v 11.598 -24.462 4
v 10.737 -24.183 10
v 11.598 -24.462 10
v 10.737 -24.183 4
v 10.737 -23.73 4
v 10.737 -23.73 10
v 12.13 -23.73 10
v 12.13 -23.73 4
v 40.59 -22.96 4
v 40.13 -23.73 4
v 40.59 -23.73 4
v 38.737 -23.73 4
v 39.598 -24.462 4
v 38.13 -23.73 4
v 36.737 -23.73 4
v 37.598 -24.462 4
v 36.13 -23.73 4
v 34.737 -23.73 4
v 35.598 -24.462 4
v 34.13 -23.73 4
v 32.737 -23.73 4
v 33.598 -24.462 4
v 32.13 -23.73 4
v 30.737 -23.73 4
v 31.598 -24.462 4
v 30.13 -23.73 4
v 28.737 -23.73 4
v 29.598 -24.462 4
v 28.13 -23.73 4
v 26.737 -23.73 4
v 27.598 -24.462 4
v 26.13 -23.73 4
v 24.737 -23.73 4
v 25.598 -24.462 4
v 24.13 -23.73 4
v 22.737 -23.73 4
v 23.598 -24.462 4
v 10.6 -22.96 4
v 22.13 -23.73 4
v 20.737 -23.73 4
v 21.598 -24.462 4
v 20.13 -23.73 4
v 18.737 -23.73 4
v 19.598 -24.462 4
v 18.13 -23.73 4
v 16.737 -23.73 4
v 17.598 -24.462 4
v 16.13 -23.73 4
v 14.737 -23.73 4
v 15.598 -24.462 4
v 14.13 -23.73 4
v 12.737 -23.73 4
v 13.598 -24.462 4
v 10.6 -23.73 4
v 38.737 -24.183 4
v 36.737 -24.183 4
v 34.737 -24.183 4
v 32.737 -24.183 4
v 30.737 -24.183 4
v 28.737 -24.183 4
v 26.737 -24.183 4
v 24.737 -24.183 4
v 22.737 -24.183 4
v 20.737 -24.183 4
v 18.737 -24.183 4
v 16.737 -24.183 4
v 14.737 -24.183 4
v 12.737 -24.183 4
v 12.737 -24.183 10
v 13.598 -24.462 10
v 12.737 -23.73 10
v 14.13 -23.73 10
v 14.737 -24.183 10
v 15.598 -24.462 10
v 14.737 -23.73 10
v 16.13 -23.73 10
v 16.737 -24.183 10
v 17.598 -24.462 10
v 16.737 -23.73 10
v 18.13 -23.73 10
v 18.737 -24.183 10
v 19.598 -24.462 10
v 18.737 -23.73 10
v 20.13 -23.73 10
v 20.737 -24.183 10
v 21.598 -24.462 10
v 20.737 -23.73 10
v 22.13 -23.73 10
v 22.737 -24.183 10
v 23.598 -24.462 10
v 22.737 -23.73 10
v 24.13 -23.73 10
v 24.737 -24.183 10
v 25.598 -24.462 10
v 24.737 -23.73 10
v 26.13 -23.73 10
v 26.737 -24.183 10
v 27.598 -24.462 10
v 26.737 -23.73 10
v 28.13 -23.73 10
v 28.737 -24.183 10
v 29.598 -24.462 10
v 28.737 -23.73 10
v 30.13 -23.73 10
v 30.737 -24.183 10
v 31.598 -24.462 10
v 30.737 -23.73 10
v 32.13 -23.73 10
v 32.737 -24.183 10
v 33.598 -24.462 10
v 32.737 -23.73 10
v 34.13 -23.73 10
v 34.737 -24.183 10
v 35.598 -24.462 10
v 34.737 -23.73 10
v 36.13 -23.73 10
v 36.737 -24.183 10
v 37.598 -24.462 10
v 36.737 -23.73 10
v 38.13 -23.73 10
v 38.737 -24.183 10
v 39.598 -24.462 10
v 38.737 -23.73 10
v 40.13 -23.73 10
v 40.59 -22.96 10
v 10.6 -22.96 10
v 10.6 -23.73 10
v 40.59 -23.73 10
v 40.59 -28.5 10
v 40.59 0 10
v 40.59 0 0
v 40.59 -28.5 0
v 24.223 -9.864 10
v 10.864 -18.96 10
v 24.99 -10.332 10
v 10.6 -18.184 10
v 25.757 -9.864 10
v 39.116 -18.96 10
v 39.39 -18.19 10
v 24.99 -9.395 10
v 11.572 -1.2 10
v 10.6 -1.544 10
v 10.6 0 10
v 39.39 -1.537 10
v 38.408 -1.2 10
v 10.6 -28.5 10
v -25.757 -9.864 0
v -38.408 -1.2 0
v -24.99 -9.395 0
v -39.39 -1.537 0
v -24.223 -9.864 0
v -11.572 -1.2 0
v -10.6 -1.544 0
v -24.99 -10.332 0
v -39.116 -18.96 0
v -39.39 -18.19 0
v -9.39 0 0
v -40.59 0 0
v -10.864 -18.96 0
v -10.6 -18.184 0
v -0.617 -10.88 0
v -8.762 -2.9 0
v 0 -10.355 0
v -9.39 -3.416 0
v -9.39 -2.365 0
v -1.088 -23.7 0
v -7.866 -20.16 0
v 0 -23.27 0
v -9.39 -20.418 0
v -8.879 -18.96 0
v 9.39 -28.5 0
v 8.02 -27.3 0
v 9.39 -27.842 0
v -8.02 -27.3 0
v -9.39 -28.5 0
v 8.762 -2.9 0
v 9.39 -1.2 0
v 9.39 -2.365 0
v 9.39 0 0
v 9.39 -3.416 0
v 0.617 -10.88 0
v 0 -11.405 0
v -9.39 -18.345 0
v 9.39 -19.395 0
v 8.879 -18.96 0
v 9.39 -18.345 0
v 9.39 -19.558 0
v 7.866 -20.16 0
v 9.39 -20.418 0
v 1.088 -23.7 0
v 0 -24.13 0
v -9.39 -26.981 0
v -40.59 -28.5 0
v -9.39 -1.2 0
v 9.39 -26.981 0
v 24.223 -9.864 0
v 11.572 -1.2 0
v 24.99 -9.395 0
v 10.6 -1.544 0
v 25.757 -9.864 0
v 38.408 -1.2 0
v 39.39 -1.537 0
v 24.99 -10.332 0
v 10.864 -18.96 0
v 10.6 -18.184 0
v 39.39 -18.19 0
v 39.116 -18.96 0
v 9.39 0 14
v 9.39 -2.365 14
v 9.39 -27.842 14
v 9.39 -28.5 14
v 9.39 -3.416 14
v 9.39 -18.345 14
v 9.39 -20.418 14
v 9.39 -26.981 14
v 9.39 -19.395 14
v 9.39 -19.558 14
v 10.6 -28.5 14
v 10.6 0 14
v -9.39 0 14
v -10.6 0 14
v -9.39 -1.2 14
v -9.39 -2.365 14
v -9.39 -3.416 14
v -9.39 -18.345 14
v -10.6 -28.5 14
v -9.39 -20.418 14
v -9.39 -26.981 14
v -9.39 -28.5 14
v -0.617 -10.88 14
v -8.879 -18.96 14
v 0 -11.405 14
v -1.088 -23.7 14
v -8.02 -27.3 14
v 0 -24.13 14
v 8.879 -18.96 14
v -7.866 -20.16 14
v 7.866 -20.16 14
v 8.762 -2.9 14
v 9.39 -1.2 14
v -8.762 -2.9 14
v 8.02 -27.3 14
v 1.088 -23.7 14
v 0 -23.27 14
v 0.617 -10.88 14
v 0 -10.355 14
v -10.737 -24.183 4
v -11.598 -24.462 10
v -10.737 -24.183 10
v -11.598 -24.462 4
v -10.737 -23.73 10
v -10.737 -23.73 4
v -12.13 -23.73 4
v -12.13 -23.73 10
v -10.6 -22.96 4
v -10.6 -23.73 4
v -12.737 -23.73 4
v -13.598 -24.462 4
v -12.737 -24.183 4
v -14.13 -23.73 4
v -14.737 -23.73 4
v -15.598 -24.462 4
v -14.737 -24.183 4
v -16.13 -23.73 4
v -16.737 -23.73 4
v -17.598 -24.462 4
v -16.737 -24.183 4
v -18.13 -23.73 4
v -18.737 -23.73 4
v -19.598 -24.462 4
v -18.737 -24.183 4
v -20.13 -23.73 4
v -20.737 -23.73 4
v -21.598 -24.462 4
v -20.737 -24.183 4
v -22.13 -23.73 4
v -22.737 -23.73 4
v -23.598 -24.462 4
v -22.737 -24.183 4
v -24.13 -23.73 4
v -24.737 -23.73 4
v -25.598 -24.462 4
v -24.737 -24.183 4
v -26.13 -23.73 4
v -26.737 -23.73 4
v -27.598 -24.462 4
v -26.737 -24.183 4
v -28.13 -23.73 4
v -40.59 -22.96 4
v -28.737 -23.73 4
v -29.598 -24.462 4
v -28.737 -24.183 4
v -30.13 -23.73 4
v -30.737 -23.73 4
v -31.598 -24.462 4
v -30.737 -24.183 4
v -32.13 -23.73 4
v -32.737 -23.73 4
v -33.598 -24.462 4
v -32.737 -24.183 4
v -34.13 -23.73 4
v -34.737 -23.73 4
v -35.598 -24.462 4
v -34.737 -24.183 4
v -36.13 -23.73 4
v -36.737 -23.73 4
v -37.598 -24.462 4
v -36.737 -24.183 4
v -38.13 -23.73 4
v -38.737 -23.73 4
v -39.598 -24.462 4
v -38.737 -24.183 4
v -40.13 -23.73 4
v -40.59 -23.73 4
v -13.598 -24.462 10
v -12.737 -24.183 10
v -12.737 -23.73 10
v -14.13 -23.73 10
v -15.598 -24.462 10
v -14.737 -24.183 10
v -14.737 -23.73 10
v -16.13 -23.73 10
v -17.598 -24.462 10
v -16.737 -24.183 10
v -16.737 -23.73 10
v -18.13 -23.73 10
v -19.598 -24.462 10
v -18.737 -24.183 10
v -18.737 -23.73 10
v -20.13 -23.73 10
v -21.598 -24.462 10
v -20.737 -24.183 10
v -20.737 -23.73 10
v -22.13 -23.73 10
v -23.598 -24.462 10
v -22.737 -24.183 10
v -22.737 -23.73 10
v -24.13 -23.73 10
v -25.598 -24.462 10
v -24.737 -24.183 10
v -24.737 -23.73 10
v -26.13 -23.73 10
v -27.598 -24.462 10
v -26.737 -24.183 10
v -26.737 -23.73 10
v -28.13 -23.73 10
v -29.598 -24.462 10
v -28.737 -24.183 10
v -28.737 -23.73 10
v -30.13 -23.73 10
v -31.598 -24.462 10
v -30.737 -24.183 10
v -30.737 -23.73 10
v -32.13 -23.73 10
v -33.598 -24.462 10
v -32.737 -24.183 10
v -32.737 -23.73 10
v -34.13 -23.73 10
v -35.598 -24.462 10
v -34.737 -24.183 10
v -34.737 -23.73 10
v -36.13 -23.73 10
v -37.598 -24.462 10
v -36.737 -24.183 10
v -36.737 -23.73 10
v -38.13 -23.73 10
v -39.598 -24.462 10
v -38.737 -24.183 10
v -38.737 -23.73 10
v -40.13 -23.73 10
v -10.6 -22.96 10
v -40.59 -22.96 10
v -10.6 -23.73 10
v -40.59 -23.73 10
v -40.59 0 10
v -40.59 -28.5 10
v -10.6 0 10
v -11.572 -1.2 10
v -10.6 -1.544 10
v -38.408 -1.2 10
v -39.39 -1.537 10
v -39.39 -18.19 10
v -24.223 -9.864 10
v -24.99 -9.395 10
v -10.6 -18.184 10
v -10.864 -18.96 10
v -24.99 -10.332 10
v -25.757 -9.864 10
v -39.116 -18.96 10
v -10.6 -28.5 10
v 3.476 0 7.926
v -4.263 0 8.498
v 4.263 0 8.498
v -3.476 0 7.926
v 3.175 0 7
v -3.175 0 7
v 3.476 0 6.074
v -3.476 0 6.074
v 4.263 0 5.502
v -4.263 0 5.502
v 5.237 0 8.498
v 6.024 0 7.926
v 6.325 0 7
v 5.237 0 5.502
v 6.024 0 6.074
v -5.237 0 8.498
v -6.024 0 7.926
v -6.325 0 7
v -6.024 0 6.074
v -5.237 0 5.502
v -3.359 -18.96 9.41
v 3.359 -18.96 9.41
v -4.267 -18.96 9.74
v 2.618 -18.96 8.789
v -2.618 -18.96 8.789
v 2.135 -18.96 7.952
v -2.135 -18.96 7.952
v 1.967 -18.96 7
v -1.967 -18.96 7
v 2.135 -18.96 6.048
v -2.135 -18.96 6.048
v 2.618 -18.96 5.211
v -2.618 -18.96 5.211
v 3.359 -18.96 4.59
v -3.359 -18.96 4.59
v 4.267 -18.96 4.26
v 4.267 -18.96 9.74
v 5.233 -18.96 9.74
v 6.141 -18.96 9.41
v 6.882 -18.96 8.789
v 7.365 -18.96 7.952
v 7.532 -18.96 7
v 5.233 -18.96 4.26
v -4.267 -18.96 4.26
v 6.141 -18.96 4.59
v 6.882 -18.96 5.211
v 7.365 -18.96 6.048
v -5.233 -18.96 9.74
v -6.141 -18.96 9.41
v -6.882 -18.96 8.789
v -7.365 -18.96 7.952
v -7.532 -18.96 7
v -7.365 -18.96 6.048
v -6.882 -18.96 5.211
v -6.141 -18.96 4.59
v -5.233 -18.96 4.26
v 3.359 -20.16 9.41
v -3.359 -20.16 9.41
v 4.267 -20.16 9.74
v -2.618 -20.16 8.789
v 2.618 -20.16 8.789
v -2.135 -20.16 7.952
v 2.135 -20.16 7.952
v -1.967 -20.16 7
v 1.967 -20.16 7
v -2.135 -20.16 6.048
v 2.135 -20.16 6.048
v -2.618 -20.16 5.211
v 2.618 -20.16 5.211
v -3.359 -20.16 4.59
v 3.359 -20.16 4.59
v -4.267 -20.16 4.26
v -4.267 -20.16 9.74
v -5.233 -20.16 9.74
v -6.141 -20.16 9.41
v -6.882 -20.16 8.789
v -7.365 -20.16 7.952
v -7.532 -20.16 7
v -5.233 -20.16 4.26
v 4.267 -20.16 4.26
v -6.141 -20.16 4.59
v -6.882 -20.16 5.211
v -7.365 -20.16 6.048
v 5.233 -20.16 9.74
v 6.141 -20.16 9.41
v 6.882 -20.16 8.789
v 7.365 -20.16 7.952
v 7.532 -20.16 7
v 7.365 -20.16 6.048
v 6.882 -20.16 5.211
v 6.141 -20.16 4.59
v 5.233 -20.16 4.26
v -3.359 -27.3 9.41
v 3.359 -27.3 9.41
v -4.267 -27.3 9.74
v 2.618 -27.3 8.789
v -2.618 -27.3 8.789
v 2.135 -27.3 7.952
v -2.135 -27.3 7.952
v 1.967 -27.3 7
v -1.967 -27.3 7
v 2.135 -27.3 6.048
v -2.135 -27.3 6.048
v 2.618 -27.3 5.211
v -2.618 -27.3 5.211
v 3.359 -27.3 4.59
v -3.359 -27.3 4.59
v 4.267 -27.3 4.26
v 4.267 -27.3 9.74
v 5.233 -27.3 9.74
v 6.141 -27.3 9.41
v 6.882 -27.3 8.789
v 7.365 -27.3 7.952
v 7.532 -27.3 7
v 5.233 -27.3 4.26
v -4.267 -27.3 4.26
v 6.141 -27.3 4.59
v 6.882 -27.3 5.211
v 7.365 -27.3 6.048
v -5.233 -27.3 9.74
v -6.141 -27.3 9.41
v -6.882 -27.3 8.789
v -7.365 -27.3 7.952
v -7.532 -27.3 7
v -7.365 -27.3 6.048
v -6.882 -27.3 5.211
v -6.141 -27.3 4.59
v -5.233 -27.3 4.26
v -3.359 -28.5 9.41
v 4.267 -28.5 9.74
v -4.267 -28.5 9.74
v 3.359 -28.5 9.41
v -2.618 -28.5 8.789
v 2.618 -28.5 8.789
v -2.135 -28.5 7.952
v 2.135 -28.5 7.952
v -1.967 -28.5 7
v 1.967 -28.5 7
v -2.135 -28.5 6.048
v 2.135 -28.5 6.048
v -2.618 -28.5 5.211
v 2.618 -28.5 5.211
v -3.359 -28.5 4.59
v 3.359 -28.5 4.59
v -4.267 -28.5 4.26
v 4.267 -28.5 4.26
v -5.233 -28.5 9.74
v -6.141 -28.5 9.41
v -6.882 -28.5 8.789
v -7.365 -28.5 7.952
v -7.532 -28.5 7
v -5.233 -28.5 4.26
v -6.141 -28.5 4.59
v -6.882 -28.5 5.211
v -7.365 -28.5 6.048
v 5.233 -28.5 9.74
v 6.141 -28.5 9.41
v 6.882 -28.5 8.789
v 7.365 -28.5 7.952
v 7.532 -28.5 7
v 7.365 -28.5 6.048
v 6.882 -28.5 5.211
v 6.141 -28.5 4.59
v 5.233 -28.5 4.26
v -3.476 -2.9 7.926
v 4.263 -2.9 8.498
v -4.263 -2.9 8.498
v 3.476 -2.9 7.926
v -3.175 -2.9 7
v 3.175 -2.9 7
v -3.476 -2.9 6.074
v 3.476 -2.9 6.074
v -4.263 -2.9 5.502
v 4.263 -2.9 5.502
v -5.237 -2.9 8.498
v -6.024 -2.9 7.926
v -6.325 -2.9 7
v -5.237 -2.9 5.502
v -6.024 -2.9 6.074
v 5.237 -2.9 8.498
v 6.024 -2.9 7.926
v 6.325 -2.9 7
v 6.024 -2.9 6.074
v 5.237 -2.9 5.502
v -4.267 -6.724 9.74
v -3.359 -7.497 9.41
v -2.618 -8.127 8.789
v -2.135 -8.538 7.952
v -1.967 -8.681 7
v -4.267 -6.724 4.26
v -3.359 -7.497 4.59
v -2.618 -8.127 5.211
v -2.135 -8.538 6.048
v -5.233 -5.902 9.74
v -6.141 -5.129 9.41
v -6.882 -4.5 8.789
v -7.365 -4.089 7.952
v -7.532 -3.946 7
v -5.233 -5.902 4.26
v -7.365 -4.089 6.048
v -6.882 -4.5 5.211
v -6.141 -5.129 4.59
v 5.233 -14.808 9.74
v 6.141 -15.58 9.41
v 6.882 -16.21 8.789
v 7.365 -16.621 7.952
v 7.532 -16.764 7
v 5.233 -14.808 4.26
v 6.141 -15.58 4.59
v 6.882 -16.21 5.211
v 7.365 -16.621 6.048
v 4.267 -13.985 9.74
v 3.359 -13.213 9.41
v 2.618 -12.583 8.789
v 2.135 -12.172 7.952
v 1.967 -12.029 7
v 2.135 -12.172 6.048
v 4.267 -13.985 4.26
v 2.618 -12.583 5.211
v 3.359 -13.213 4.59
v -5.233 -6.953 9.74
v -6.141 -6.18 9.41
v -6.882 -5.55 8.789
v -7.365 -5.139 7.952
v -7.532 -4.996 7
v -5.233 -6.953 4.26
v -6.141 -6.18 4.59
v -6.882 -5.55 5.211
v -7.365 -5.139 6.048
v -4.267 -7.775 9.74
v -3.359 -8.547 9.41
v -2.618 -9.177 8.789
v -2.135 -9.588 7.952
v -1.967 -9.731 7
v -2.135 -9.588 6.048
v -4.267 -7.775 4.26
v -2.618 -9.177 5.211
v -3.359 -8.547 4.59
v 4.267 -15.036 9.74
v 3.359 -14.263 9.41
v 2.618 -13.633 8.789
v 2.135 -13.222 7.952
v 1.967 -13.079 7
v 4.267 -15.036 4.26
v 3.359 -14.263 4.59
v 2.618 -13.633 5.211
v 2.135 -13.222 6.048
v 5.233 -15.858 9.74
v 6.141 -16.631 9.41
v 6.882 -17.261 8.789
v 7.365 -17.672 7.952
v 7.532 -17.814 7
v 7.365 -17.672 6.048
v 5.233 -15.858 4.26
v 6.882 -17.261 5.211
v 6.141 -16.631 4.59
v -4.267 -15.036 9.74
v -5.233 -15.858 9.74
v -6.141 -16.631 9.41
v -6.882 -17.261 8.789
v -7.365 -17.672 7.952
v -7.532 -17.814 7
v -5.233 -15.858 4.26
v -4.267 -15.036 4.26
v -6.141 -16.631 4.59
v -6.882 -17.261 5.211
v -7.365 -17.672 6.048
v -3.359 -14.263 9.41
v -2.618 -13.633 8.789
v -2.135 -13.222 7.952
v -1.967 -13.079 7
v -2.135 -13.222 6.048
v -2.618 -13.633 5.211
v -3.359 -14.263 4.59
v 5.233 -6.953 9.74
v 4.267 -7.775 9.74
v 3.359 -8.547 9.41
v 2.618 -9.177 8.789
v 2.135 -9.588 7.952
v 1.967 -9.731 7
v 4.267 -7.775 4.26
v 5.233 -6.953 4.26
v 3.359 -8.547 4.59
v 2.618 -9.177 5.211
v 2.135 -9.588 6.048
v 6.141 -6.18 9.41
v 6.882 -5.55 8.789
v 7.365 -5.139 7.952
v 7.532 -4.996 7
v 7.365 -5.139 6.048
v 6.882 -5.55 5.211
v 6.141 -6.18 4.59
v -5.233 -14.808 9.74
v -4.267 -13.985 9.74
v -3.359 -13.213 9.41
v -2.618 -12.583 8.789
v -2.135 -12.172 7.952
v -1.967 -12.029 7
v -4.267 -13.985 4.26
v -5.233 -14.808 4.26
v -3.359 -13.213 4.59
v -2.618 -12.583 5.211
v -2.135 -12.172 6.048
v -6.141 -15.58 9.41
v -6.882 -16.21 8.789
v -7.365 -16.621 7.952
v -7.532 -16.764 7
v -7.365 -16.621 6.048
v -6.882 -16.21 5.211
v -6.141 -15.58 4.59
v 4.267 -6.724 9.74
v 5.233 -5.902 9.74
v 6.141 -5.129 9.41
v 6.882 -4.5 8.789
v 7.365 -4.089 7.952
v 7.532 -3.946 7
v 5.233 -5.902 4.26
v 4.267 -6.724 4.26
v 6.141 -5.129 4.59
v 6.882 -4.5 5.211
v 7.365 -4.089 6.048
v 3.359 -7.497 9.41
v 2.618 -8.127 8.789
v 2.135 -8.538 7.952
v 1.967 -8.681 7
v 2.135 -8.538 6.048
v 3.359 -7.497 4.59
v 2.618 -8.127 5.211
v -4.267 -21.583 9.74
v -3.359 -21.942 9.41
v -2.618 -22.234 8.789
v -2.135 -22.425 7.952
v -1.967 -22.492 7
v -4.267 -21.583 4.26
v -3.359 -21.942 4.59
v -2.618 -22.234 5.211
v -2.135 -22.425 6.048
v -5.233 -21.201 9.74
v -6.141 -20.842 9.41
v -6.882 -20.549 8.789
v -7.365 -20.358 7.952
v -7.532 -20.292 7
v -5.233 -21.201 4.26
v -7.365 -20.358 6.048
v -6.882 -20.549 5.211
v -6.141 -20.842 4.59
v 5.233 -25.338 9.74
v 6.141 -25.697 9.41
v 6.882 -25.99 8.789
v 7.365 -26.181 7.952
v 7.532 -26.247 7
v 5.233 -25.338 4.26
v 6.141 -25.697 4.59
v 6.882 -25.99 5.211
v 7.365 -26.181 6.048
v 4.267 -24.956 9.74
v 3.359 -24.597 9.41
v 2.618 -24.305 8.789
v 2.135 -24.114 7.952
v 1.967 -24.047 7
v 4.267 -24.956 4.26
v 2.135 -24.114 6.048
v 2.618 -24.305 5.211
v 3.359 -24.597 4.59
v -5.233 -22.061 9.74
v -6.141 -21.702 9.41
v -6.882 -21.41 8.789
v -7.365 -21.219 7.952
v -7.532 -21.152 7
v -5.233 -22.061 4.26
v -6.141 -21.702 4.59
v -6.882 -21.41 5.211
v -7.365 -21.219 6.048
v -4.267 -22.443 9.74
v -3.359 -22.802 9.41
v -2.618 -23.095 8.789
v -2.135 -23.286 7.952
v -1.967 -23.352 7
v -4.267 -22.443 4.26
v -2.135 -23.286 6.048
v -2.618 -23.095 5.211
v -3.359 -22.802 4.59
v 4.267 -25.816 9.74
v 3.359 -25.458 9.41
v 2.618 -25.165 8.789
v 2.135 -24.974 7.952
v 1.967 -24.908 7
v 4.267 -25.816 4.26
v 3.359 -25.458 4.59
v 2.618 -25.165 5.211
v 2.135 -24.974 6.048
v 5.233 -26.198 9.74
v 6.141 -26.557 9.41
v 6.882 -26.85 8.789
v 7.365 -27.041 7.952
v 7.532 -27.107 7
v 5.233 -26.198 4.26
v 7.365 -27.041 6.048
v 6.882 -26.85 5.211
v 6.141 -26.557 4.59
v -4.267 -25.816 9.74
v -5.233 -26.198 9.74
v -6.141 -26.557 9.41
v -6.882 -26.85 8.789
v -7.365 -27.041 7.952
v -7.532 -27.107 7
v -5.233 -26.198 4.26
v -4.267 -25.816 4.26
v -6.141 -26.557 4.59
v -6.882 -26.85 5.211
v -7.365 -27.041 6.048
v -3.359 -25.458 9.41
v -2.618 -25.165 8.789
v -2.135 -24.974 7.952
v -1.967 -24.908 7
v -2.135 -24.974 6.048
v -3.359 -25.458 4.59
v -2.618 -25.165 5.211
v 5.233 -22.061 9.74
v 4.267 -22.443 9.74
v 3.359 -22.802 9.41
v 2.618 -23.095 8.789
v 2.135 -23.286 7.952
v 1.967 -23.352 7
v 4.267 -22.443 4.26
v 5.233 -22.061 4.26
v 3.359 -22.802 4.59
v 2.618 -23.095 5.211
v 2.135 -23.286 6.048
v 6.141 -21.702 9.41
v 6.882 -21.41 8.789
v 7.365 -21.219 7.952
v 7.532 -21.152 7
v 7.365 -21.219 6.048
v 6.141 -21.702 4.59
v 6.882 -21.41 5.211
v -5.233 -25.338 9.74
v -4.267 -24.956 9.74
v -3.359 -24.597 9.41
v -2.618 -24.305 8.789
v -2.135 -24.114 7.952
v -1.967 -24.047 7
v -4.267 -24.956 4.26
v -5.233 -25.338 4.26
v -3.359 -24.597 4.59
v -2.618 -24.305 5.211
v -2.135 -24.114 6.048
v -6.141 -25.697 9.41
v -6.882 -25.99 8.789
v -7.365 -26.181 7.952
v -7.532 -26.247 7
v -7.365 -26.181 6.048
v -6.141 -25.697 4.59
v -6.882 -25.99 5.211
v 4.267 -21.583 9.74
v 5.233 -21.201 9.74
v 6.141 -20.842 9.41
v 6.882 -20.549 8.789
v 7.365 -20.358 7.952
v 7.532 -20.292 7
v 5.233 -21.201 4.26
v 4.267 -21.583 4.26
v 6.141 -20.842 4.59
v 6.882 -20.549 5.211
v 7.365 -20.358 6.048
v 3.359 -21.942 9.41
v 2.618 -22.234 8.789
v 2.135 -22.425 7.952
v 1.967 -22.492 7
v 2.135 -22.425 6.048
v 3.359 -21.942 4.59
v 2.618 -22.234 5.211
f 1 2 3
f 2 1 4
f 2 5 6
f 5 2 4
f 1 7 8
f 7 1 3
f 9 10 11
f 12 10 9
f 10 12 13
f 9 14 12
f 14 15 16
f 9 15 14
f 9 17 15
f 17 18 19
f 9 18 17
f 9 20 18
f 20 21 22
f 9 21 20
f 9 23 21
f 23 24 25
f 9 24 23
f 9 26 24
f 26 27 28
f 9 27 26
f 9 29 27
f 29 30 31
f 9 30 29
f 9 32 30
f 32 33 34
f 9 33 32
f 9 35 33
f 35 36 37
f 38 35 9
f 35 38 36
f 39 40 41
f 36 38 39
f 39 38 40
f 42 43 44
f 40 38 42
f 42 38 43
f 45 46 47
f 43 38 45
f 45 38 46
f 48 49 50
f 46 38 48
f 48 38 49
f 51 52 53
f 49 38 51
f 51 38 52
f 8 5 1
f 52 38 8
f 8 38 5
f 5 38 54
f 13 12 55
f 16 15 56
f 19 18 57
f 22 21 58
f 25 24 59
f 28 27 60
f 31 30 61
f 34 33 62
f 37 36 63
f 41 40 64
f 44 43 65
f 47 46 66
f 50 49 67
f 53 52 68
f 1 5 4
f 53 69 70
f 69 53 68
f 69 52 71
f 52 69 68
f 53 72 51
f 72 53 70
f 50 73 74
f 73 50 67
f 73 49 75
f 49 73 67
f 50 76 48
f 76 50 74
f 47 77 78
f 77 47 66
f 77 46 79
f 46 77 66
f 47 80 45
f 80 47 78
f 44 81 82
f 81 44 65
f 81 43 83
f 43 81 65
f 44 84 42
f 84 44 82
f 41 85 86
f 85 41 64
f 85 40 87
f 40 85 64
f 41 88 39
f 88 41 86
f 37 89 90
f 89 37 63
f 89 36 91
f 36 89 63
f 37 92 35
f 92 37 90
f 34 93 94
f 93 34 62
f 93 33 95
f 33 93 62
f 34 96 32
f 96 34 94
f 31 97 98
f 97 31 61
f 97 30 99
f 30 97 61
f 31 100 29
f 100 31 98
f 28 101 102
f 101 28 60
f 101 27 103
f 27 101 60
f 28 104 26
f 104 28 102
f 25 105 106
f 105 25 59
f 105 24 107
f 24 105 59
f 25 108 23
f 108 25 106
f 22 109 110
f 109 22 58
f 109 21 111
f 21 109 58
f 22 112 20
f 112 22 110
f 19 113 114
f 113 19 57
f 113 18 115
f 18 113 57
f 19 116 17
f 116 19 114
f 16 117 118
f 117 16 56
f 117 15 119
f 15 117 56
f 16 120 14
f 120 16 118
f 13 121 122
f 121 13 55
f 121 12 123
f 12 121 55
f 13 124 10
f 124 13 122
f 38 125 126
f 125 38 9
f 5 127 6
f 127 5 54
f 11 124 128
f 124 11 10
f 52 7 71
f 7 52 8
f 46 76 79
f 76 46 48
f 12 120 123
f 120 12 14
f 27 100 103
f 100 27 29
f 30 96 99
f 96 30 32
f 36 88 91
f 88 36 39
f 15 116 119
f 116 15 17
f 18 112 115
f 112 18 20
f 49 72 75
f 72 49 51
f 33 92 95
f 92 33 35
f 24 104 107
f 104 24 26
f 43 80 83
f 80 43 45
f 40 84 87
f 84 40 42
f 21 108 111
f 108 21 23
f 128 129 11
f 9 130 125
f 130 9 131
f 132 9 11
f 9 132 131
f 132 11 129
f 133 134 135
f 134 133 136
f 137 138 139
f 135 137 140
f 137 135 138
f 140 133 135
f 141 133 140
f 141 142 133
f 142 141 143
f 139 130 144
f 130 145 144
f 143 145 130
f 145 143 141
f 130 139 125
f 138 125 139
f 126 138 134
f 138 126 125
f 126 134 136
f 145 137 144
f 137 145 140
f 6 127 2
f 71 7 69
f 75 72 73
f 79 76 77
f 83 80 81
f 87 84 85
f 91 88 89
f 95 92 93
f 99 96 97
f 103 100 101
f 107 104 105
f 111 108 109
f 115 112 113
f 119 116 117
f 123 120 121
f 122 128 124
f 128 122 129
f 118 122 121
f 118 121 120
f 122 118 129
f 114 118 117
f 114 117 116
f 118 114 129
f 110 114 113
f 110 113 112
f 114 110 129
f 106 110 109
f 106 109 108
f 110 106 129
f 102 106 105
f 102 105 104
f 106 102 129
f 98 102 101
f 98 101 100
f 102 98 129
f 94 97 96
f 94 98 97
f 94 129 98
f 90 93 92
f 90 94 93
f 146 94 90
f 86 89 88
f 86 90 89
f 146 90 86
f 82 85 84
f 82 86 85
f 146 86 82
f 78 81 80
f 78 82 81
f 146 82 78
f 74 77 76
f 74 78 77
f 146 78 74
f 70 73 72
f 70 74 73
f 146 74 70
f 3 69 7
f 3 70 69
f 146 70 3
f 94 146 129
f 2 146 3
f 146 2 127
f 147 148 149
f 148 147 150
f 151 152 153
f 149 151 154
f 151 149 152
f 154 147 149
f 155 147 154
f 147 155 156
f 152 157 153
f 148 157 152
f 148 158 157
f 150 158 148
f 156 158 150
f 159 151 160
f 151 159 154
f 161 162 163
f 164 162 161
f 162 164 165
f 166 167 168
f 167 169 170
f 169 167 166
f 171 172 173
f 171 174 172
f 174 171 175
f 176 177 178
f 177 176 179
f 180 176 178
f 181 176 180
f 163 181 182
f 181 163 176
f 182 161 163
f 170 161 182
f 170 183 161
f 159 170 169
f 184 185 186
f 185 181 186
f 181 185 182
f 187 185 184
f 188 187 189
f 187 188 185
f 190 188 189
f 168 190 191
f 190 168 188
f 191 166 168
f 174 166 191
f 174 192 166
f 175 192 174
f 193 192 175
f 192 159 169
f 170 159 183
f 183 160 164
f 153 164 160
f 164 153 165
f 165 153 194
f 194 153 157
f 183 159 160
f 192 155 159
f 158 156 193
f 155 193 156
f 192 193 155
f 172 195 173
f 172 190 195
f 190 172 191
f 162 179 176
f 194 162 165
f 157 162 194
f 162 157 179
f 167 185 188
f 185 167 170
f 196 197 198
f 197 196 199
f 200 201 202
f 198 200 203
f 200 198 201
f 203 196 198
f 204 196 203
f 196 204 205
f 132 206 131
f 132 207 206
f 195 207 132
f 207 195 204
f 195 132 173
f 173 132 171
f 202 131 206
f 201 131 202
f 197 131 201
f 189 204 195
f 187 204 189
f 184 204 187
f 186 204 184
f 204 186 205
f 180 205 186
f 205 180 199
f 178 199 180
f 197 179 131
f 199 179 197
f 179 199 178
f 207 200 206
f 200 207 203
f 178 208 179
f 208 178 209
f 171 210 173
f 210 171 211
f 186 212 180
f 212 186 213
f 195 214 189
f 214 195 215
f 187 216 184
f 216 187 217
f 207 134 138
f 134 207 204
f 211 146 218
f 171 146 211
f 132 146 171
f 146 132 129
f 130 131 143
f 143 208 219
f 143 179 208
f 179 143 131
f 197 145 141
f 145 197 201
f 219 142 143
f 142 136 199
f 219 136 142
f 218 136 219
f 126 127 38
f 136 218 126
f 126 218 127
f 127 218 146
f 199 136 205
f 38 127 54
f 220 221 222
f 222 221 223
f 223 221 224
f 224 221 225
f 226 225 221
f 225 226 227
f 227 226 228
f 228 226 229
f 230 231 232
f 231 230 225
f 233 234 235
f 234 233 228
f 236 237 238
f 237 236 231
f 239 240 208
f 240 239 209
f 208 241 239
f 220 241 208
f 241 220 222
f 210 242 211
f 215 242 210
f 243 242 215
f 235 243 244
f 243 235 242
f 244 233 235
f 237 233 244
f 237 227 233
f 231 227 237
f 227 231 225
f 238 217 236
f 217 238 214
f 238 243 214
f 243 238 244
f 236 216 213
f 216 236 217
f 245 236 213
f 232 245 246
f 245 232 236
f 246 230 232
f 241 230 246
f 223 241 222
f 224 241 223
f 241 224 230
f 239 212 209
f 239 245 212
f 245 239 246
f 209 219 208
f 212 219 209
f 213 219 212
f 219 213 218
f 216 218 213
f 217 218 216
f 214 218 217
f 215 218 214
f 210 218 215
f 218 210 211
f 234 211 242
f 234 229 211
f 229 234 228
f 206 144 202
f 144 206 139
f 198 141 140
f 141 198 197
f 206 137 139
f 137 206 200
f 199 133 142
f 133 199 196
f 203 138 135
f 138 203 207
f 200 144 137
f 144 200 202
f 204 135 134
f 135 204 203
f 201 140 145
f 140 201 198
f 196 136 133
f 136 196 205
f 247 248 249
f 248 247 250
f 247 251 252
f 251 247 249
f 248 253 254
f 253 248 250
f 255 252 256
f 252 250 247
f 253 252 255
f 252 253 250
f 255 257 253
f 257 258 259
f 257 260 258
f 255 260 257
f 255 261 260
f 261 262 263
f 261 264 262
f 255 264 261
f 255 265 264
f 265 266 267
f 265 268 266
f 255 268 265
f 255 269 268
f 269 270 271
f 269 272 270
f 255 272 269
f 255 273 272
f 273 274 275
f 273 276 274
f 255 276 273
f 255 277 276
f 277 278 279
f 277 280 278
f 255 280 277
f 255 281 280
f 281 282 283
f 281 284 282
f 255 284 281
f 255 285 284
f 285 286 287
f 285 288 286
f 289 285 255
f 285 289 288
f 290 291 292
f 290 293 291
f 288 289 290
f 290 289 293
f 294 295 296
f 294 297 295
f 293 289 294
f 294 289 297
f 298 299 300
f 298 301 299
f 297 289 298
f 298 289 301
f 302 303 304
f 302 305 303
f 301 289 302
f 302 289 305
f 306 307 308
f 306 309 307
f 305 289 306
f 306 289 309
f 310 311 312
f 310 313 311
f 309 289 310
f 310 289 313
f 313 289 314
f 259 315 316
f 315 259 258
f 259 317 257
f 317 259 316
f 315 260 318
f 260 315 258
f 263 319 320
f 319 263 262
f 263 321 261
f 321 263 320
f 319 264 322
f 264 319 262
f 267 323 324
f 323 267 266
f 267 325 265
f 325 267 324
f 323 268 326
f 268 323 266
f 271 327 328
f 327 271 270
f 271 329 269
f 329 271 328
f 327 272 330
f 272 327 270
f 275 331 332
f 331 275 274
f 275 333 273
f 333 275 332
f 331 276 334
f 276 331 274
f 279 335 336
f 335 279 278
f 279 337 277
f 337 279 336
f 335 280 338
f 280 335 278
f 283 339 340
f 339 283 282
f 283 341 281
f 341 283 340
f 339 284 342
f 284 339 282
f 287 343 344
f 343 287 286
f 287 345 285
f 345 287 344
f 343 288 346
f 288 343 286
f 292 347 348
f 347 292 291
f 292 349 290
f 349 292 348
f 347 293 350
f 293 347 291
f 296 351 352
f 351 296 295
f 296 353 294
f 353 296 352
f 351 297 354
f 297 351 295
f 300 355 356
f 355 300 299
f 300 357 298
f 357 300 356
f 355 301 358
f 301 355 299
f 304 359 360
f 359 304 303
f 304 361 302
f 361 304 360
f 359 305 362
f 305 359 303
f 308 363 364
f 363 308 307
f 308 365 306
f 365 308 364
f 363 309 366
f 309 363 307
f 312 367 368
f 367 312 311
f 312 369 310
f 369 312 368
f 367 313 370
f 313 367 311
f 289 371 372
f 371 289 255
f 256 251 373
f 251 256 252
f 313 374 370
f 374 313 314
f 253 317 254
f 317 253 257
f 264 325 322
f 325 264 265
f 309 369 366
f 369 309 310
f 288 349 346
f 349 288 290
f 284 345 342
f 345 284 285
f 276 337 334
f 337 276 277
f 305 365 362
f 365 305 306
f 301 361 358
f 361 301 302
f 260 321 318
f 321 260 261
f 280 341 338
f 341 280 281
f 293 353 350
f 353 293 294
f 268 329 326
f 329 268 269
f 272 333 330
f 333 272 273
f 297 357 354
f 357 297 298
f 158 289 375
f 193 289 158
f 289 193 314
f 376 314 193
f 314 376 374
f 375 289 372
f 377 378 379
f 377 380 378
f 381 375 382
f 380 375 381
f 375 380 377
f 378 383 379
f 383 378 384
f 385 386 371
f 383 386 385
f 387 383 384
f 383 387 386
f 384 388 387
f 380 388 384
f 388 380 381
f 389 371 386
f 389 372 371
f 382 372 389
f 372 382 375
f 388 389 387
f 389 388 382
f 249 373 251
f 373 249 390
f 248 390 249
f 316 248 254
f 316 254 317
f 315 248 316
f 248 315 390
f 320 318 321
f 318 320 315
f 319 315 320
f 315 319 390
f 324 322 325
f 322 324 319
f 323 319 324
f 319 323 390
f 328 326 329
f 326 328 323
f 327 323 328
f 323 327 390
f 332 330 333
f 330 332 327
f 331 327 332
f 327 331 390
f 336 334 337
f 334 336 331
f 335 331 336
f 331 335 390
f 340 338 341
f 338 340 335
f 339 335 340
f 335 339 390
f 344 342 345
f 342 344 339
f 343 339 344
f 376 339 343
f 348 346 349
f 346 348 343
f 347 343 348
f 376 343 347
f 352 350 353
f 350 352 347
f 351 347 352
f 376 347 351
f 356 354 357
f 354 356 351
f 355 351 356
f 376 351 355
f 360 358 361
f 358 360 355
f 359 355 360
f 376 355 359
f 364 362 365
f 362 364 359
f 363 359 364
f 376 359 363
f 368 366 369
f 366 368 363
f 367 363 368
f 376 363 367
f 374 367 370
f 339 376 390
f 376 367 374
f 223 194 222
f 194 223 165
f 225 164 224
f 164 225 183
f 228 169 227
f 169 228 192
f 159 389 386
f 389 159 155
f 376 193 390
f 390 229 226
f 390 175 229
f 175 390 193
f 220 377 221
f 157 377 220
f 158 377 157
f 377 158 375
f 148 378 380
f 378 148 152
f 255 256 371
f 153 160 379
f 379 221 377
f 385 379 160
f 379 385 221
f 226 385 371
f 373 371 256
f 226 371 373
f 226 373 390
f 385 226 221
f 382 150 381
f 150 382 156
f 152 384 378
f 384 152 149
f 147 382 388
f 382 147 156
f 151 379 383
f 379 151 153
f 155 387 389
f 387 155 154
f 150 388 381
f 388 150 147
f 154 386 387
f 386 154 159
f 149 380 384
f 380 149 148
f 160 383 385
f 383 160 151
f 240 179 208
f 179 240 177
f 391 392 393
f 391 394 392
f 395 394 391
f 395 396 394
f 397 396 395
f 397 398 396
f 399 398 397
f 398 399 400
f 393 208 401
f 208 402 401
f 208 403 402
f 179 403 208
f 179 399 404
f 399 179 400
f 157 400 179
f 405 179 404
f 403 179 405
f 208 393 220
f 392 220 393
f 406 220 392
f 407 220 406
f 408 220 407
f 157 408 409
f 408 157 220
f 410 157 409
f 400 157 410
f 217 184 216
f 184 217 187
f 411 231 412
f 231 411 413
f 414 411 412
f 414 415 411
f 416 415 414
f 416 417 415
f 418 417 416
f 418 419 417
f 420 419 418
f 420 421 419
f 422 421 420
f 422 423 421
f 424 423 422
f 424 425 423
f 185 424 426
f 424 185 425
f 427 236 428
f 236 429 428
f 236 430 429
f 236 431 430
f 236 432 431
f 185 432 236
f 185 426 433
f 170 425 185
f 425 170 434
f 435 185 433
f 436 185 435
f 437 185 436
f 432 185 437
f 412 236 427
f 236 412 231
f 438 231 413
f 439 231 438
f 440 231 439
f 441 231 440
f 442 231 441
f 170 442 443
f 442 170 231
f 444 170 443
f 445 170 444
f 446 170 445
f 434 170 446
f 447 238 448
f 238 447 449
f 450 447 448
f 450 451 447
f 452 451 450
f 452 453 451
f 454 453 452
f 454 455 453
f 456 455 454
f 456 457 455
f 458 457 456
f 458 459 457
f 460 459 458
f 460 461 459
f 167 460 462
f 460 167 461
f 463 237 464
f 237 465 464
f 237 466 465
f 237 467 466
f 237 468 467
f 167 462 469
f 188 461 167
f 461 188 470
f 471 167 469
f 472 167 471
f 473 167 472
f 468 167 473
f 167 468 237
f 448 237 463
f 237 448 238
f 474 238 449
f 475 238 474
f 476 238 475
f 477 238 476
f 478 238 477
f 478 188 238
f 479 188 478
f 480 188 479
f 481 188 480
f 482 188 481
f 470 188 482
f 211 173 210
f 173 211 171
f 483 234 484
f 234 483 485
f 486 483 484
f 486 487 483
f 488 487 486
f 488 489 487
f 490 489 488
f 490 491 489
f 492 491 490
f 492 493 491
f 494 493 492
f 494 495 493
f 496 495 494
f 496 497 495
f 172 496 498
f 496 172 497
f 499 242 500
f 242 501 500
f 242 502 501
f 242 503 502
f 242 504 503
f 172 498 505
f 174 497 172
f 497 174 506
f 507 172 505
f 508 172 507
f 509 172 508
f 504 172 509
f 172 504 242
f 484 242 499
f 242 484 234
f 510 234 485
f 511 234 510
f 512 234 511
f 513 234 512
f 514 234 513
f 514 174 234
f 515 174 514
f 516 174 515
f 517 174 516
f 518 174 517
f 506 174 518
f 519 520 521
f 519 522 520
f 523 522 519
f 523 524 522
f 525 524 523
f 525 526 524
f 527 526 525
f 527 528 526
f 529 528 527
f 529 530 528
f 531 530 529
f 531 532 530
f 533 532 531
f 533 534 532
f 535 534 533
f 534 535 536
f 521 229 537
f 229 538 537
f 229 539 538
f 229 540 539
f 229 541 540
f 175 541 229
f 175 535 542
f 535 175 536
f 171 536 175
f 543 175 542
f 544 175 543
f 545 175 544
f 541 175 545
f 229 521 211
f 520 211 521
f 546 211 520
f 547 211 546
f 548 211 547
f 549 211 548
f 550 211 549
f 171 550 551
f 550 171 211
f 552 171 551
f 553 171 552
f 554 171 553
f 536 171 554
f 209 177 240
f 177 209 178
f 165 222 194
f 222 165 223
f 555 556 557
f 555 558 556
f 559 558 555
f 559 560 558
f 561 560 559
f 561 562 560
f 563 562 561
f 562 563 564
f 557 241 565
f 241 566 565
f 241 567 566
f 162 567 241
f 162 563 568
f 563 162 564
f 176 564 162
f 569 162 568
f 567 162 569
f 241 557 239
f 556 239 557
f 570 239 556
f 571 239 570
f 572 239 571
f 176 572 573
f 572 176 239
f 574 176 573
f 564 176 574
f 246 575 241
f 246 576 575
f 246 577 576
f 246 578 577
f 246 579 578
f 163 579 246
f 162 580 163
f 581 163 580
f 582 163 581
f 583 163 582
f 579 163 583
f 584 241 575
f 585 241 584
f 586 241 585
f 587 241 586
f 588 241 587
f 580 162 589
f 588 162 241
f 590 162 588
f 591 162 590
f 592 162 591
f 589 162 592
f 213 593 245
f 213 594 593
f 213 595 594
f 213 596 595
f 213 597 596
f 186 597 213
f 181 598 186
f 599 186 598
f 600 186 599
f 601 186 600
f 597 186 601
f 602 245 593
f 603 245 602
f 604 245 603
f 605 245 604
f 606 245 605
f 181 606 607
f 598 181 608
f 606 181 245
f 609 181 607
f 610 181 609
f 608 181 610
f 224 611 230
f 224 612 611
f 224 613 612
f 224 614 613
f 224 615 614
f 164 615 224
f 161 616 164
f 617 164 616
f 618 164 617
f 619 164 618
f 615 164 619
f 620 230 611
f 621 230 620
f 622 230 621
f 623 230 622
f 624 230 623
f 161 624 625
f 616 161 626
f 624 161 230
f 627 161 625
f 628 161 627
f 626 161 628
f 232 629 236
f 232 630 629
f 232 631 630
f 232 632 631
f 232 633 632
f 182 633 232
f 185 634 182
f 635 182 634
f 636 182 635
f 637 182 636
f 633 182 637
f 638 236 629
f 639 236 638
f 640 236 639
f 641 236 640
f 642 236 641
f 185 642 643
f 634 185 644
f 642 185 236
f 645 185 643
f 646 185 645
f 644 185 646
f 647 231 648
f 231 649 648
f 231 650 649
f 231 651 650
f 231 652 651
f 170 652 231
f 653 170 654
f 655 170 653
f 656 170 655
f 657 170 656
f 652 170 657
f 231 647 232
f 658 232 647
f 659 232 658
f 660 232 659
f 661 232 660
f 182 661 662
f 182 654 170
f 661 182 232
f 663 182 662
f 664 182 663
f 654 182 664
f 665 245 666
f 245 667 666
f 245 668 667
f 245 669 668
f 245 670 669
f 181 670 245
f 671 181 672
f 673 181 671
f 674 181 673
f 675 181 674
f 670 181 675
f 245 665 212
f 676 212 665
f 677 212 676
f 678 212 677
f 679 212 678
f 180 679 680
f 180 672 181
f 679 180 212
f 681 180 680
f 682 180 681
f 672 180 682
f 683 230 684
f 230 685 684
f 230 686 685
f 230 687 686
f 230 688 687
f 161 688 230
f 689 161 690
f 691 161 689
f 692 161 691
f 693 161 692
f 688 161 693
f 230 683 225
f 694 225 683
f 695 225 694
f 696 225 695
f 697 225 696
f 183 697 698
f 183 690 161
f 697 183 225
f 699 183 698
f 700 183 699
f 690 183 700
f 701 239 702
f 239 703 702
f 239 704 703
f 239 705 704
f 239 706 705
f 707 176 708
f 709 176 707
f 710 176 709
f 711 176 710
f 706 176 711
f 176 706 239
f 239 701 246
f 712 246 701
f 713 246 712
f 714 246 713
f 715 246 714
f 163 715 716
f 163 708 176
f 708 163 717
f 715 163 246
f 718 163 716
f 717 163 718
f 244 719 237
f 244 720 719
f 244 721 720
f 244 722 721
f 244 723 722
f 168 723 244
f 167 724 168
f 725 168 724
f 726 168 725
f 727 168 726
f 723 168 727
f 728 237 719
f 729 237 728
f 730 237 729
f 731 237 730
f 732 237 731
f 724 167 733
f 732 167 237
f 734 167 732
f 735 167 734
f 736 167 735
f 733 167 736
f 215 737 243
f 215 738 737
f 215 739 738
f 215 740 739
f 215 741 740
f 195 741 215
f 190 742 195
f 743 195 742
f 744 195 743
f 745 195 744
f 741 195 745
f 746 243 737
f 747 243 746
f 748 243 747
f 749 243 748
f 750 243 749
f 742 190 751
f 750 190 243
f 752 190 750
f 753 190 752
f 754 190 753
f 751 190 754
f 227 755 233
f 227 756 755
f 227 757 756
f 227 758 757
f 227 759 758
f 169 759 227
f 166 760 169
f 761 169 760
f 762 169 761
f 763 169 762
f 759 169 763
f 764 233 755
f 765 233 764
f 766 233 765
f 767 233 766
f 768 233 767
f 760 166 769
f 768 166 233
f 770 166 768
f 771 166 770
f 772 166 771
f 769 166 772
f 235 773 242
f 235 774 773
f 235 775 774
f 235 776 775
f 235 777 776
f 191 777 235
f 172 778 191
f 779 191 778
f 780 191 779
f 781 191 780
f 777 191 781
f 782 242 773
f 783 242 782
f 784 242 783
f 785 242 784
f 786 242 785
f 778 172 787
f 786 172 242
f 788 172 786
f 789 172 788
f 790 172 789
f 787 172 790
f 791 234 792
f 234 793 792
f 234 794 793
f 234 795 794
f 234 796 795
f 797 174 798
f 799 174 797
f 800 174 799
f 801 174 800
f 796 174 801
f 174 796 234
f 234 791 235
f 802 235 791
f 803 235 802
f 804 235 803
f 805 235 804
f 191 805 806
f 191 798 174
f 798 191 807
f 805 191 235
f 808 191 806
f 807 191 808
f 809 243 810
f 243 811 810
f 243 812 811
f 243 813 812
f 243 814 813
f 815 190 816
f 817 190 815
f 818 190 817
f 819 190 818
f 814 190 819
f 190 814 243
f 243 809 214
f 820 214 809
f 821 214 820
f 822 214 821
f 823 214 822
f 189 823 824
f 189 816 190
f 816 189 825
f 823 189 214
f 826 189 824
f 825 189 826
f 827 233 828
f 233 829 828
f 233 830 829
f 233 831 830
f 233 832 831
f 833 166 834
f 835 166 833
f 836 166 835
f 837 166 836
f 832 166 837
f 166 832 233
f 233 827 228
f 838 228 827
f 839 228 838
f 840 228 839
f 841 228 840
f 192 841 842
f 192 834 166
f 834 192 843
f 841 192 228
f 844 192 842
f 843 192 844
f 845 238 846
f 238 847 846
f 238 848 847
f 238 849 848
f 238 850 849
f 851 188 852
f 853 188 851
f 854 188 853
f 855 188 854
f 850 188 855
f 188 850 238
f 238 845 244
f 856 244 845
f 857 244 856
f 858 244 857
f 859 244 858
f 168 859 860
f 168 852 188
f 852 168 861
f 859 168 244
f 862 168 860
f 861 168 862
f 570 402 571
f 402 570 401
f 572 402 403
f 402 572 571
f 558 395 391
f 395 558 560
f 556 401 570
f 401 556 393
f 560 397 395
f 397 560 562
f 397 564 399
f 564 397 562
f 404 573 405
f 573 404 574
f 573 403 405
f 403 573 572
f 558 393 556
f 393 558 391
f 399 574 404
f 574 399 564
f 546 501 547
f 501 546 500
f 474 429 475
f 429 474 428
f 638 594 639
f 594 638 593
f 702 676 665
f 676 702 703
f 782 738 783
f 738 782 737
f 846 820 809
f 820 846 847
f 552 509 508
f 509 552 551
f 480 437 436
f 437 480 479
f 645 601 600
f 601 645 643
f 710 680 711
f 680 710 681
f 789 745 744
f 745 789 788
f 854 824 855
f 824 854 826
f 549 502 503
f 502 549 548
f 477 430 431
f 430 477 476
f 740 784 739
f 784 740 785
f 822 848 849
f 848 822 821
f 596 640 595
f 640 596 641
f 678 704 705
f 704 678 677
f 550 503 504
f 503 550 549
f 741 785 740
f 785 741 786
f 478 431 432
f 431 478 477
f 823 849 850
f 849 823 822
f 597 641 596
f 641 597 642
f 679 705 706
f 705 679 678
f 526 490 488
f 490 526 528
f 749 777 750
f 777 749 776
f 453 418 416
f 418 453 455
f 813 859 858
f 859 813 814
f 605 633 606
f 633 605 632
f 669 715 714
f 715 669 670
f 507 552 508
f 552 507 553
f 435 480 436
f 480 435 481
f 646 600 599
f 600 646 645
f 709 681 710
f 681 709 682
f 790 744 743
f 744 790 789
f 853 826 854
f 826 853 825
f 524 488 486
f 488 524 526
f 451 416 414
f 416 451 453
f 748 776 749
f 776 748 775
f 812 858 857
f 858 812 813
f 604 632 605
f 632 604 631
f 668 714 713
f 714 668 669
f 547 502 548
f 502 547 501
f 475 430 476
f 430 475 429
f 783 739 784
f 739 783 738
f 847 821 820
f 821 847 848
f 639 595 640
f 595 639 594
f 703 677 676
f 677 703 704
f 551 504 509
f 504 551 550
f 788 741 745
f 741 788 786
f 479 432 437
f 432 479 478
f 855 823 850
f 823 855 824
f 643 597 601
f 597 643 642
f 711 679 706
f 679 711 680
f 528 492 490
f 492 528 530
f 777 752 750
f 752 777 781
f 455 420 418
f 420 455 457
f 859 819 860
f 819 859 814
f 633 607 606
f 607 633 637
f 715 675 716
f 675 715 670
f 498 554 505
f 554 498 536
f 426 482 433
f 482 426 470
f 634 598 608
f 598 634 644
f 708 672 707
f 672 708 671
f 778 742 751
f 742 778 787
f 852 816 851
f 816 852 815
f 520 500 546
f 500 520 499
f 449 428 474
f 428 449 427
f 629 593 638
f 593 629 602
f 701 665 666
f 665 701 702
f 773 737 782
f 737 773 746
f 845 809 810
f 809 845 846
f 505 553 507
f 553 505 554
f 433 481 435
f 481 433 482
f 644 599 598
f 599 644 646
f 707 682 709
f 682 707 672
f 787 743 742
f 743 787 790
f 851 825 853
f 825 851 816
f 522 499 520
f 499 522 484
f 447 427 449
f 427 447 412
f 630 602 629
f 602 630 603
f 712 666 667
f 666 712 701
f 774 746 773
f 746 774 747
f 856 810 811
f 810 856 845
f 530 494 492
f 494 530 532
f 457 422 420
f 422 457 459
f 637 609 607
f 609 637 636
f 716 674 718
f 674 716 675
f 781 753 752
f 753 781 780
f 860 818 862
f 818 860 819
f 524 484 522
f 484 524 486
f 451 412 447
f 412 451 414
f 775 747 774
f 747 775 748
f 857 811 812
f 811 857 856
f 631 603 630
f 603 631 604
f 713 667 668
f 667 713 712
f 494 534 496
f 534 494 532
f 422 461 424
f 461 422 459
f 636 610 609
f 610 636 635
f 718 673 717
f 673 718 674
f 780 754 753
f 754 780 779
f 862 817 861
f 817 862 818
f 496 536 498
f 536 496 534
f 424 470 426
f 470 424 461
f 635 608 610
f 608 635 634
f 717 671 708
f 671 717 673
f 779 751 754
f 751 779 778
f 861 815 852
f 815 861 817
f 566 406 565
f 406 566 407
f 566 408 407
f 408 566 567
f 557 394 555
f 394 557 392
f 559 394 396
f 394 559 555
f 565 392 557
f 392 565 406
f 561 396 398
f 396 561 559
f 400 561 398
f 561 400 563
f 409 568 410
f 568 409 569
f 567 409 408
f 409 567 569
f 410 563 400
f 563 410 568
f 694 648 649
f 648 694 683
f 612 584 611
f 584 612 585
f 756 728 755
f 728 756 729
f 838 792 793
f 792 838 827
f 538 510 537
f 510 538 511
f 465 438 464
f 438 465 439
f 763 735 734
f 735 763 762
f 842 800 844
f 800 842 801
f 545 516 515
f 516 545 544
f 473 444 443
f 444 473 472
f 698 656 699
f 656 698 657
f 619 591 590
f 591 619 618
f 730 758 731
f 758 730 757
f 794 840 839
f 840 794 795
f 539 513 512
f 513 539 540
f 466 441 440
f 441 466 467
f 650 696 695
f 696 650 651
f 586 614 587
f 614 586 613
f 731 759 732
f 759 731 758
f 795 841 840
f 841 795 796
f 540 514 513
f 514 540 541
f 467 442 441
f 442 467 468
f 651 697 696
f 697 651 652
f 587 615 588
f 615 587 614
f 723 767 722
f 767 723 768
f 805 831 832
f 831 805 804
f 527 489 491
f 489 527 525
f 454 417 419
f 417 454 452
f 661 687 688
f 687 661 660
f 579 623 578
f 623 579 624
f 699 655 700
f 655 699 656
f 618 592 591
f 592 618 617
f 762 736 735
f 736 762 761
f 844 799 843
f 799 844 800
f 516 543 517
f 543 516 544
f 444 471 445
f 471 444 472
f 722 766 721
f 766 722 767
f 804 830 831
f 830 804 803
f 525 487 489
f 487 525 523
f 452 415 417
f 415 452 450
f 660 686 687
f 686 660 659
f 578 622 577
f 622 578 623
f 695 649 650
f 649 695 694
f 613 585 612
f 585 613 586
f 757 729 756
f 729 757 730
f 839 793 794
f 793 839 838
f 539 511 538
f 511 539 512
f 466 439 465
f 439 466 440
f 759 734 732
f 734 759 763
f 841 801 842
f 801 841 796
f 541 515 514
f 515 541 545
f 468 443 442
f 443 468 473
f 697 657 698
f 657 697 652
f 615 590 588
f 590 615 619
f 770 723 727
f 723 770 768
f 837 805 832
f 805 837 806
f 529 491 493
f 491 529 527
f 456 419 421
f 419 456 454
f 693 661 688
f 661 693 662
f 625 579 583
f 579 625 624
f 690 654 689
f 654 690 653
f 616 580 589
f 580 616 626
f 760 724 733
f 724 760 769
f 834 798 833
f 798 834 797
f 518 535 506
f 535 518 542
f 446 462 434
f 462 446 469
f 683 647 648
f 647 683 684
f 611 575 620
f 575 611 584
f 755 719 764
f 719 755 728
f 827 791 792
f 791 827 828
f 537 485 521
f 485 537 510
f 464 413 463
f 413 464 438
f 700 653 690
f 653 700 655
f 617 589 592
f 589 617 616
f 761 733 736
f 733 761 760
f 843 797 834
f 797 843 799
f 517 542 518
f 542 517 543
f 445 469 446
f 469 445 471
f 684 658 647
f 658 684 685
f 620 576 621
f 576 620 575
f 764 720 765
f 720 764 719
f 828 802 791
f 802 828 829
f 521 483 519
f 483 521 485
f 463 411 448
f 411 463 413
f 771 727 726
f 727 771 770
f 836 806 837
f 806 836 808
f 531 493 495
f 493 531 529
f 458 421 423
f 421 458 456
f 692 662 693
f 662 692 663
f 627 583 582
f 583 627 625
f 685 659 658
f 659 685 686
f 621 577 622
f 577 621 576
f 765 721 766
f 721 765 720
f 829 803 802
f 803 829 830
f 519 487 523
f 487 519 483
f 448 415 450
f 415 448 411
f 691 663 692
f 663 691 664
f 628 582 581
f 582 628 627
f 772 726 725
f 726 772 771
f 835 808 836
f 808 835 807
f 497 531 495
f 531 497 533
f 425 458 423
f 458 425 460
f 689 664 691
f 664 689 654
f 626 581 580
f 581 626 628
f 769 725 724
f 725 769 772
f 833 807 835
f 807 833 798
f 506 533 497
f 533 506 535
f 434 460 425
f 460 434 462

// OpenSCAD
// -*- mode: SCAD ; c-file-style: "ellemtel" ; coding: utf-8 -*-
//
// Y Belt holder for the Průša-style GeeTech i3 pro C
//
// © 2017–18 Roland Sieker <ospalh@gmail.com>
// Licence: CC-BY-SA 4.0

// … to preview. You will get all parts when you click “Create Thing”.
part = "holder"; // [holder: the y belt holder, square: square nut holder, hex: hex nut holder, test: test shape for sizing the belt]

// Set this to “render” and click on “Create Thing” when done with the setup.
preview = 1; // [0:render, 1:preview]


// The main dimensions of the printer
belt_bed_d = 24.5; // Distance the belt should be below the bed.
// When this is off too much, the belt tension varies, which can’t be good.
// Measure from the bed to the bottom of the belt.

hole_hole_y = 9.5;
// Distance between the mounting holes

d_screw = 3;  // M3 screws.
d_washer = 5.3;
// Use two square nuts
nut_t = 1.7;
nut_w = 5.6;
// screw_length = 10;

h_nut_t = 2.3;
h_nut_d = 5.4;
h_nut_r =  h_nut_d/sqrt(3);


// Dimensions of the belt (apparently GT2)
belt_pitch = 2;
/* belt_w = 6; */
belt_w = 6;
belt_t1 = 0.7;
belt_r = 0.7;


// Dimensions of the holder
truss_r_w = 1.2;  // Width of rectancgular truss members
truss_d_w = 0.8;  // Width of diagonal truss members
belt_bracket_w = 4;  // Width of the side and lower part of the belt brackets.
// They have to be sturdier than the trusses, as they are free hanging
belt_bracket_y = 30; // Length  of one belt bracket

extra_z = 4; // for the screw holes


swf = 1.05; // (wiggle factor)
bwf = 1.10; // (wiggle factor)
ms = 0.01; // Muggeseggle

// fn for differently sized objects and fs, fa; all for preview or rendering.
pna = 40;
pnb = 15;
pa = 5;
ps = 1;
rna = 180;
rnb = 30;
ra = 1;
rs = 0.1;
function na() = (preview) ? pna : rna;
function nb() = (preview) ? pnb : rnb;
$fs = (preview) ? ps : rs;
$fa = (preview) ? pa : ra;


enw = nut_w * swf;
ebt = belt_t1 * bwf;
ebr = belt_r * bwf;

fz = belt_bracket_w + belt_w;
fzc = fz + extra_z;
inner_truss_y = hole_hole_y + enw + 2 * nut_t;

r_sh = d_screw/2 * swf;
r_waho = d_washer/2 * swf;

y_0 = 0; // Datum

some_distance_x =  belt_bracket_y/2;
some_distance_y =  belt_bed_d/2;



print_part();
// preview_parts();



module print_part()
{
   if ("holder" == part)
   {
      belt_holder();
   }
   if ("square" == part)
   {
      square_nut_holder();
   }
   if ("hex" == part)
   {
      hex_nut_holder();
   }
   if ("test" == part)
   {
      belt_test_shape();
   }
}

module preview_parts()
{
   belt_holder();
   translate([0, some_distance_y, 0])
   {
      translate([-some_distance_x, 0, 0])
      {
         square_nut_holder();
      }
      translate([some_distance_x, 0, 0])
      {
         hex_nut_holder();
      }
   }
   translate([0, 2*some_distance_y, 0])
   {
      belt_test_shape();
   }
}





module belt_holder()
{
// Create the actual shapes
   translate([inner_truss_y/2, 0, 0])
   {
      one_bracket();
   }
   mirror()
   {
      translate([inner_truss_y/2, 0, 0])
      {
         one_bracket();
      }
   }
   center_bracket();
}

module square_nut_holder()
{
   difference()
   {
      translate([0,0,(truss_r_w+nut_t)/2])
      {
         cube(
            [hole_hole_y+nut_w+2*truss_r_w, nut_w+2*truss_r_w, (truss_r_w+nut_t)],
            center=true);

      }

      holes();
      mirror()
      {
         holes();
      }
   }
   module holes()
   {
      translate([hole_hole_y/2, 0, 0])
      {
         translate([0,0,-ms])
         {
            cylinder(r=r_sh, h=truss_r_w+nut_t+2*ms);
         }
         translate([0,0,truss_r_w+nut_t/2+ms])
         {
            cube([nut_w, nut_w, nut_t+ms], center=true);
         }
      }
   }
// nut_t = 1.7;
// nut_w = 5.6;
// hole_hole_y = 9.5;
}


module hex_nut_holder()
{
   difference()
   {
      translate([0,0,(truss_r_w+h_nut_t)/2])
      {
         cube(
            [hole_hole_y+h_nut_d+2*truss_r_w, nut_w+2*truss_r_w, (truss_r_w+nut_t)],
            center=true);

      }

      holes();
      mirror()
      {
         holes();
      }
   }
   module holes()
   {
      translate([hole_hole_y/2, 0, 0])
      {
         translate([0,0,-ms])
         {
            cylinder(r=r_sh, h=truss_r_w+h_nut_t+2*ms);
         }
         translate([0,0,truss_r_w])
         {
            cylinder(r=h_nut_r, h=h_nut_t+ms, $fn=6);
         }
      }
   }
// nut_t = 1.7;
// nut_w = 5.6;
// hole_hole_y = 9.5;
}

module center_bracket()
{
   difference()
   {
      p_center_bracket();
      screw_hole();
      mirror()
      {
         screw_hole();
      }
   }
   module p_center_bracket()
   {
      translate([-inner_truss_y/2, -truss_r_w, 0])
      {
         cube([inner_truss_y, truss_r_w, fzc]);
         translate([0, -belt_bed_d+ebt+ebr+belt_bracket_w,0])
         {
            cube([inner_truss_y, truss_r_w, fzc]);
         }
         translate([0, -belt_bed_d-belt_bracket_w+truss_r_w,0])
         {
            cube([inner_truss_y, truss_r_w, fzc]);
         }
      }
      translate([-inner_truss_y/2, -truss_r_w-nut_t, 0])
      {
         cube([inner_truss_y, nut_t, fzc]);
      }
      one_ot(belt_bed_d-ebt-ebr-belt_bracket_w-nut_t-0.5*truss_r_w, -1.5*truss_r_w-nut_t);
      mirror()
      {
         one_ot(belt_bed_d-ebt-ebr-belt_bracket_w-nut_t-0.5*truss_r_w, -1.5*truss_r_w-nut_t);
      }
      one_ot(
         2*belt_bracket_w+ebr+ebt-1.5*truss_r_w,
         -belt_bed_d+ebt+ebr+belt_bracket_w-1.5*truss_r_w);
      mirror()
      {
         one_ot(
            2*belt_bracket_w+ebr+ebt-1.5*truss_r_w,
            -belt_bed_d+ebt+ebr+belt_bracket_w-1.5*truss_r_w);
      }
   }
   module one_ot(zl, oz)
   {
      translate([-inner_truss_y/2, oz,0])
      {
         yl = inner_truss_y+truss_d_w;
         dl = sqrt(yl*yl+zl*zl);
         da = atan(zl/yl);
         translate([-sqrt(0.5)*truss_d_w, sqrt(0.5)*truss_d_w, 0])
         {
            rotate(-da)
               cube([dl,truss_d_w,fzc]);
         }
      }
   }
   module screw_hole()
   {
      translate([hole_hole_y/2, ms, belt_bracket_w + belt_w/2])
      {
         rotate([90, 0, 0])
         {
            cylinder(r=r_sh, h=truss_r_w+nut_t+2*ms);
         }
      }
      translate([hole_hole_y/2, -truss_r_w-nut_t-0.5, belt_bracket_w + belt_w/2])
      {
         rotate([90, 0, 0])
         {
            cylinder(r=r_waho, h=belt_bed_d+belt_bracket_w+ms);
         }
      }
   }
}

ebby = belt_bracket_y + truss_r_w;
tz = belt_bed_d + belt_bracket_w;
truss_z_a = belt_bed_d - ebr -ebt;
truss_y = belt_bracket_y-truss_r_w;
truss_z_m = truss_z_a  - ebt-belt_bracket_w -truss_r_w/2;
tdl = sqrt(belt_bracket_y*belt_bracket_y+truss_z_m*truss_z_m);
tda = atan(truss_z_m/truss_y);
bt =  ebr + ebt + 2*belt_bracket_w;

module one_bracket()
{

   translate([0, -truss_r_w, 0])
   {
      cube([ebby, truss_r_w, fz]);
   }
   translate([0, -belt_bed_d-belt_bracket_w,0])
   {
      cube([truss_r_w+ms, belt_bed_d+belt_bracket_w, fzc]);
   }

   translate([0, -truss_z_a, 0])
   {
      translate([belt_bracket_y, 0, 0])
      {
         cube([truss_r_w, truss_z_a, fz]);
      }
   }
   one_truss();
   translate([belt_bracket_y+truss_r_w, 0, 0])
   {
      mirror()
      {
         one_truss();
      }
   }
   module one_truss()
   {
      translate([truss_r_w, -truss_r_w/2,0])
      {
         rotate(-tda)
         {
            translate([0, -truss_d_w,  0])
            {
               cube([tdl, truss_d_w, fz]);
            }
         }
      }
   }
   translate([0, -tz, 0])
   {
      difference()
      {
         cube([ebby, bt, fz]);
         translate([truss_r_w, bt-belt_bracket_w - ebt,belt_bracket_w])
         {
            n_belt();
         }
      }
   }
   // bz = belt_bed_d - ebt;

}


module n_belt()
{
   cube([belt_bracket_y+ms, ebt, belt_w+ms]);
   translate([ebr, 0,0])
   {
      for (o=[0:belt_pitch:belt_bracket_y])
      {
         translate([o, 0, 0])
         {
            cylinder(r=ebr, h=belt_w+ms);
         }
      }
   }
}

module belt_test_shape()
{
   difference()
   {
      cube([ebby, bt, fz]);
      translate([truss_r_w, bt-belt_bracket_w - ebt,belt_bracket_w])
      {
         n_belt();
      }
   }
}
